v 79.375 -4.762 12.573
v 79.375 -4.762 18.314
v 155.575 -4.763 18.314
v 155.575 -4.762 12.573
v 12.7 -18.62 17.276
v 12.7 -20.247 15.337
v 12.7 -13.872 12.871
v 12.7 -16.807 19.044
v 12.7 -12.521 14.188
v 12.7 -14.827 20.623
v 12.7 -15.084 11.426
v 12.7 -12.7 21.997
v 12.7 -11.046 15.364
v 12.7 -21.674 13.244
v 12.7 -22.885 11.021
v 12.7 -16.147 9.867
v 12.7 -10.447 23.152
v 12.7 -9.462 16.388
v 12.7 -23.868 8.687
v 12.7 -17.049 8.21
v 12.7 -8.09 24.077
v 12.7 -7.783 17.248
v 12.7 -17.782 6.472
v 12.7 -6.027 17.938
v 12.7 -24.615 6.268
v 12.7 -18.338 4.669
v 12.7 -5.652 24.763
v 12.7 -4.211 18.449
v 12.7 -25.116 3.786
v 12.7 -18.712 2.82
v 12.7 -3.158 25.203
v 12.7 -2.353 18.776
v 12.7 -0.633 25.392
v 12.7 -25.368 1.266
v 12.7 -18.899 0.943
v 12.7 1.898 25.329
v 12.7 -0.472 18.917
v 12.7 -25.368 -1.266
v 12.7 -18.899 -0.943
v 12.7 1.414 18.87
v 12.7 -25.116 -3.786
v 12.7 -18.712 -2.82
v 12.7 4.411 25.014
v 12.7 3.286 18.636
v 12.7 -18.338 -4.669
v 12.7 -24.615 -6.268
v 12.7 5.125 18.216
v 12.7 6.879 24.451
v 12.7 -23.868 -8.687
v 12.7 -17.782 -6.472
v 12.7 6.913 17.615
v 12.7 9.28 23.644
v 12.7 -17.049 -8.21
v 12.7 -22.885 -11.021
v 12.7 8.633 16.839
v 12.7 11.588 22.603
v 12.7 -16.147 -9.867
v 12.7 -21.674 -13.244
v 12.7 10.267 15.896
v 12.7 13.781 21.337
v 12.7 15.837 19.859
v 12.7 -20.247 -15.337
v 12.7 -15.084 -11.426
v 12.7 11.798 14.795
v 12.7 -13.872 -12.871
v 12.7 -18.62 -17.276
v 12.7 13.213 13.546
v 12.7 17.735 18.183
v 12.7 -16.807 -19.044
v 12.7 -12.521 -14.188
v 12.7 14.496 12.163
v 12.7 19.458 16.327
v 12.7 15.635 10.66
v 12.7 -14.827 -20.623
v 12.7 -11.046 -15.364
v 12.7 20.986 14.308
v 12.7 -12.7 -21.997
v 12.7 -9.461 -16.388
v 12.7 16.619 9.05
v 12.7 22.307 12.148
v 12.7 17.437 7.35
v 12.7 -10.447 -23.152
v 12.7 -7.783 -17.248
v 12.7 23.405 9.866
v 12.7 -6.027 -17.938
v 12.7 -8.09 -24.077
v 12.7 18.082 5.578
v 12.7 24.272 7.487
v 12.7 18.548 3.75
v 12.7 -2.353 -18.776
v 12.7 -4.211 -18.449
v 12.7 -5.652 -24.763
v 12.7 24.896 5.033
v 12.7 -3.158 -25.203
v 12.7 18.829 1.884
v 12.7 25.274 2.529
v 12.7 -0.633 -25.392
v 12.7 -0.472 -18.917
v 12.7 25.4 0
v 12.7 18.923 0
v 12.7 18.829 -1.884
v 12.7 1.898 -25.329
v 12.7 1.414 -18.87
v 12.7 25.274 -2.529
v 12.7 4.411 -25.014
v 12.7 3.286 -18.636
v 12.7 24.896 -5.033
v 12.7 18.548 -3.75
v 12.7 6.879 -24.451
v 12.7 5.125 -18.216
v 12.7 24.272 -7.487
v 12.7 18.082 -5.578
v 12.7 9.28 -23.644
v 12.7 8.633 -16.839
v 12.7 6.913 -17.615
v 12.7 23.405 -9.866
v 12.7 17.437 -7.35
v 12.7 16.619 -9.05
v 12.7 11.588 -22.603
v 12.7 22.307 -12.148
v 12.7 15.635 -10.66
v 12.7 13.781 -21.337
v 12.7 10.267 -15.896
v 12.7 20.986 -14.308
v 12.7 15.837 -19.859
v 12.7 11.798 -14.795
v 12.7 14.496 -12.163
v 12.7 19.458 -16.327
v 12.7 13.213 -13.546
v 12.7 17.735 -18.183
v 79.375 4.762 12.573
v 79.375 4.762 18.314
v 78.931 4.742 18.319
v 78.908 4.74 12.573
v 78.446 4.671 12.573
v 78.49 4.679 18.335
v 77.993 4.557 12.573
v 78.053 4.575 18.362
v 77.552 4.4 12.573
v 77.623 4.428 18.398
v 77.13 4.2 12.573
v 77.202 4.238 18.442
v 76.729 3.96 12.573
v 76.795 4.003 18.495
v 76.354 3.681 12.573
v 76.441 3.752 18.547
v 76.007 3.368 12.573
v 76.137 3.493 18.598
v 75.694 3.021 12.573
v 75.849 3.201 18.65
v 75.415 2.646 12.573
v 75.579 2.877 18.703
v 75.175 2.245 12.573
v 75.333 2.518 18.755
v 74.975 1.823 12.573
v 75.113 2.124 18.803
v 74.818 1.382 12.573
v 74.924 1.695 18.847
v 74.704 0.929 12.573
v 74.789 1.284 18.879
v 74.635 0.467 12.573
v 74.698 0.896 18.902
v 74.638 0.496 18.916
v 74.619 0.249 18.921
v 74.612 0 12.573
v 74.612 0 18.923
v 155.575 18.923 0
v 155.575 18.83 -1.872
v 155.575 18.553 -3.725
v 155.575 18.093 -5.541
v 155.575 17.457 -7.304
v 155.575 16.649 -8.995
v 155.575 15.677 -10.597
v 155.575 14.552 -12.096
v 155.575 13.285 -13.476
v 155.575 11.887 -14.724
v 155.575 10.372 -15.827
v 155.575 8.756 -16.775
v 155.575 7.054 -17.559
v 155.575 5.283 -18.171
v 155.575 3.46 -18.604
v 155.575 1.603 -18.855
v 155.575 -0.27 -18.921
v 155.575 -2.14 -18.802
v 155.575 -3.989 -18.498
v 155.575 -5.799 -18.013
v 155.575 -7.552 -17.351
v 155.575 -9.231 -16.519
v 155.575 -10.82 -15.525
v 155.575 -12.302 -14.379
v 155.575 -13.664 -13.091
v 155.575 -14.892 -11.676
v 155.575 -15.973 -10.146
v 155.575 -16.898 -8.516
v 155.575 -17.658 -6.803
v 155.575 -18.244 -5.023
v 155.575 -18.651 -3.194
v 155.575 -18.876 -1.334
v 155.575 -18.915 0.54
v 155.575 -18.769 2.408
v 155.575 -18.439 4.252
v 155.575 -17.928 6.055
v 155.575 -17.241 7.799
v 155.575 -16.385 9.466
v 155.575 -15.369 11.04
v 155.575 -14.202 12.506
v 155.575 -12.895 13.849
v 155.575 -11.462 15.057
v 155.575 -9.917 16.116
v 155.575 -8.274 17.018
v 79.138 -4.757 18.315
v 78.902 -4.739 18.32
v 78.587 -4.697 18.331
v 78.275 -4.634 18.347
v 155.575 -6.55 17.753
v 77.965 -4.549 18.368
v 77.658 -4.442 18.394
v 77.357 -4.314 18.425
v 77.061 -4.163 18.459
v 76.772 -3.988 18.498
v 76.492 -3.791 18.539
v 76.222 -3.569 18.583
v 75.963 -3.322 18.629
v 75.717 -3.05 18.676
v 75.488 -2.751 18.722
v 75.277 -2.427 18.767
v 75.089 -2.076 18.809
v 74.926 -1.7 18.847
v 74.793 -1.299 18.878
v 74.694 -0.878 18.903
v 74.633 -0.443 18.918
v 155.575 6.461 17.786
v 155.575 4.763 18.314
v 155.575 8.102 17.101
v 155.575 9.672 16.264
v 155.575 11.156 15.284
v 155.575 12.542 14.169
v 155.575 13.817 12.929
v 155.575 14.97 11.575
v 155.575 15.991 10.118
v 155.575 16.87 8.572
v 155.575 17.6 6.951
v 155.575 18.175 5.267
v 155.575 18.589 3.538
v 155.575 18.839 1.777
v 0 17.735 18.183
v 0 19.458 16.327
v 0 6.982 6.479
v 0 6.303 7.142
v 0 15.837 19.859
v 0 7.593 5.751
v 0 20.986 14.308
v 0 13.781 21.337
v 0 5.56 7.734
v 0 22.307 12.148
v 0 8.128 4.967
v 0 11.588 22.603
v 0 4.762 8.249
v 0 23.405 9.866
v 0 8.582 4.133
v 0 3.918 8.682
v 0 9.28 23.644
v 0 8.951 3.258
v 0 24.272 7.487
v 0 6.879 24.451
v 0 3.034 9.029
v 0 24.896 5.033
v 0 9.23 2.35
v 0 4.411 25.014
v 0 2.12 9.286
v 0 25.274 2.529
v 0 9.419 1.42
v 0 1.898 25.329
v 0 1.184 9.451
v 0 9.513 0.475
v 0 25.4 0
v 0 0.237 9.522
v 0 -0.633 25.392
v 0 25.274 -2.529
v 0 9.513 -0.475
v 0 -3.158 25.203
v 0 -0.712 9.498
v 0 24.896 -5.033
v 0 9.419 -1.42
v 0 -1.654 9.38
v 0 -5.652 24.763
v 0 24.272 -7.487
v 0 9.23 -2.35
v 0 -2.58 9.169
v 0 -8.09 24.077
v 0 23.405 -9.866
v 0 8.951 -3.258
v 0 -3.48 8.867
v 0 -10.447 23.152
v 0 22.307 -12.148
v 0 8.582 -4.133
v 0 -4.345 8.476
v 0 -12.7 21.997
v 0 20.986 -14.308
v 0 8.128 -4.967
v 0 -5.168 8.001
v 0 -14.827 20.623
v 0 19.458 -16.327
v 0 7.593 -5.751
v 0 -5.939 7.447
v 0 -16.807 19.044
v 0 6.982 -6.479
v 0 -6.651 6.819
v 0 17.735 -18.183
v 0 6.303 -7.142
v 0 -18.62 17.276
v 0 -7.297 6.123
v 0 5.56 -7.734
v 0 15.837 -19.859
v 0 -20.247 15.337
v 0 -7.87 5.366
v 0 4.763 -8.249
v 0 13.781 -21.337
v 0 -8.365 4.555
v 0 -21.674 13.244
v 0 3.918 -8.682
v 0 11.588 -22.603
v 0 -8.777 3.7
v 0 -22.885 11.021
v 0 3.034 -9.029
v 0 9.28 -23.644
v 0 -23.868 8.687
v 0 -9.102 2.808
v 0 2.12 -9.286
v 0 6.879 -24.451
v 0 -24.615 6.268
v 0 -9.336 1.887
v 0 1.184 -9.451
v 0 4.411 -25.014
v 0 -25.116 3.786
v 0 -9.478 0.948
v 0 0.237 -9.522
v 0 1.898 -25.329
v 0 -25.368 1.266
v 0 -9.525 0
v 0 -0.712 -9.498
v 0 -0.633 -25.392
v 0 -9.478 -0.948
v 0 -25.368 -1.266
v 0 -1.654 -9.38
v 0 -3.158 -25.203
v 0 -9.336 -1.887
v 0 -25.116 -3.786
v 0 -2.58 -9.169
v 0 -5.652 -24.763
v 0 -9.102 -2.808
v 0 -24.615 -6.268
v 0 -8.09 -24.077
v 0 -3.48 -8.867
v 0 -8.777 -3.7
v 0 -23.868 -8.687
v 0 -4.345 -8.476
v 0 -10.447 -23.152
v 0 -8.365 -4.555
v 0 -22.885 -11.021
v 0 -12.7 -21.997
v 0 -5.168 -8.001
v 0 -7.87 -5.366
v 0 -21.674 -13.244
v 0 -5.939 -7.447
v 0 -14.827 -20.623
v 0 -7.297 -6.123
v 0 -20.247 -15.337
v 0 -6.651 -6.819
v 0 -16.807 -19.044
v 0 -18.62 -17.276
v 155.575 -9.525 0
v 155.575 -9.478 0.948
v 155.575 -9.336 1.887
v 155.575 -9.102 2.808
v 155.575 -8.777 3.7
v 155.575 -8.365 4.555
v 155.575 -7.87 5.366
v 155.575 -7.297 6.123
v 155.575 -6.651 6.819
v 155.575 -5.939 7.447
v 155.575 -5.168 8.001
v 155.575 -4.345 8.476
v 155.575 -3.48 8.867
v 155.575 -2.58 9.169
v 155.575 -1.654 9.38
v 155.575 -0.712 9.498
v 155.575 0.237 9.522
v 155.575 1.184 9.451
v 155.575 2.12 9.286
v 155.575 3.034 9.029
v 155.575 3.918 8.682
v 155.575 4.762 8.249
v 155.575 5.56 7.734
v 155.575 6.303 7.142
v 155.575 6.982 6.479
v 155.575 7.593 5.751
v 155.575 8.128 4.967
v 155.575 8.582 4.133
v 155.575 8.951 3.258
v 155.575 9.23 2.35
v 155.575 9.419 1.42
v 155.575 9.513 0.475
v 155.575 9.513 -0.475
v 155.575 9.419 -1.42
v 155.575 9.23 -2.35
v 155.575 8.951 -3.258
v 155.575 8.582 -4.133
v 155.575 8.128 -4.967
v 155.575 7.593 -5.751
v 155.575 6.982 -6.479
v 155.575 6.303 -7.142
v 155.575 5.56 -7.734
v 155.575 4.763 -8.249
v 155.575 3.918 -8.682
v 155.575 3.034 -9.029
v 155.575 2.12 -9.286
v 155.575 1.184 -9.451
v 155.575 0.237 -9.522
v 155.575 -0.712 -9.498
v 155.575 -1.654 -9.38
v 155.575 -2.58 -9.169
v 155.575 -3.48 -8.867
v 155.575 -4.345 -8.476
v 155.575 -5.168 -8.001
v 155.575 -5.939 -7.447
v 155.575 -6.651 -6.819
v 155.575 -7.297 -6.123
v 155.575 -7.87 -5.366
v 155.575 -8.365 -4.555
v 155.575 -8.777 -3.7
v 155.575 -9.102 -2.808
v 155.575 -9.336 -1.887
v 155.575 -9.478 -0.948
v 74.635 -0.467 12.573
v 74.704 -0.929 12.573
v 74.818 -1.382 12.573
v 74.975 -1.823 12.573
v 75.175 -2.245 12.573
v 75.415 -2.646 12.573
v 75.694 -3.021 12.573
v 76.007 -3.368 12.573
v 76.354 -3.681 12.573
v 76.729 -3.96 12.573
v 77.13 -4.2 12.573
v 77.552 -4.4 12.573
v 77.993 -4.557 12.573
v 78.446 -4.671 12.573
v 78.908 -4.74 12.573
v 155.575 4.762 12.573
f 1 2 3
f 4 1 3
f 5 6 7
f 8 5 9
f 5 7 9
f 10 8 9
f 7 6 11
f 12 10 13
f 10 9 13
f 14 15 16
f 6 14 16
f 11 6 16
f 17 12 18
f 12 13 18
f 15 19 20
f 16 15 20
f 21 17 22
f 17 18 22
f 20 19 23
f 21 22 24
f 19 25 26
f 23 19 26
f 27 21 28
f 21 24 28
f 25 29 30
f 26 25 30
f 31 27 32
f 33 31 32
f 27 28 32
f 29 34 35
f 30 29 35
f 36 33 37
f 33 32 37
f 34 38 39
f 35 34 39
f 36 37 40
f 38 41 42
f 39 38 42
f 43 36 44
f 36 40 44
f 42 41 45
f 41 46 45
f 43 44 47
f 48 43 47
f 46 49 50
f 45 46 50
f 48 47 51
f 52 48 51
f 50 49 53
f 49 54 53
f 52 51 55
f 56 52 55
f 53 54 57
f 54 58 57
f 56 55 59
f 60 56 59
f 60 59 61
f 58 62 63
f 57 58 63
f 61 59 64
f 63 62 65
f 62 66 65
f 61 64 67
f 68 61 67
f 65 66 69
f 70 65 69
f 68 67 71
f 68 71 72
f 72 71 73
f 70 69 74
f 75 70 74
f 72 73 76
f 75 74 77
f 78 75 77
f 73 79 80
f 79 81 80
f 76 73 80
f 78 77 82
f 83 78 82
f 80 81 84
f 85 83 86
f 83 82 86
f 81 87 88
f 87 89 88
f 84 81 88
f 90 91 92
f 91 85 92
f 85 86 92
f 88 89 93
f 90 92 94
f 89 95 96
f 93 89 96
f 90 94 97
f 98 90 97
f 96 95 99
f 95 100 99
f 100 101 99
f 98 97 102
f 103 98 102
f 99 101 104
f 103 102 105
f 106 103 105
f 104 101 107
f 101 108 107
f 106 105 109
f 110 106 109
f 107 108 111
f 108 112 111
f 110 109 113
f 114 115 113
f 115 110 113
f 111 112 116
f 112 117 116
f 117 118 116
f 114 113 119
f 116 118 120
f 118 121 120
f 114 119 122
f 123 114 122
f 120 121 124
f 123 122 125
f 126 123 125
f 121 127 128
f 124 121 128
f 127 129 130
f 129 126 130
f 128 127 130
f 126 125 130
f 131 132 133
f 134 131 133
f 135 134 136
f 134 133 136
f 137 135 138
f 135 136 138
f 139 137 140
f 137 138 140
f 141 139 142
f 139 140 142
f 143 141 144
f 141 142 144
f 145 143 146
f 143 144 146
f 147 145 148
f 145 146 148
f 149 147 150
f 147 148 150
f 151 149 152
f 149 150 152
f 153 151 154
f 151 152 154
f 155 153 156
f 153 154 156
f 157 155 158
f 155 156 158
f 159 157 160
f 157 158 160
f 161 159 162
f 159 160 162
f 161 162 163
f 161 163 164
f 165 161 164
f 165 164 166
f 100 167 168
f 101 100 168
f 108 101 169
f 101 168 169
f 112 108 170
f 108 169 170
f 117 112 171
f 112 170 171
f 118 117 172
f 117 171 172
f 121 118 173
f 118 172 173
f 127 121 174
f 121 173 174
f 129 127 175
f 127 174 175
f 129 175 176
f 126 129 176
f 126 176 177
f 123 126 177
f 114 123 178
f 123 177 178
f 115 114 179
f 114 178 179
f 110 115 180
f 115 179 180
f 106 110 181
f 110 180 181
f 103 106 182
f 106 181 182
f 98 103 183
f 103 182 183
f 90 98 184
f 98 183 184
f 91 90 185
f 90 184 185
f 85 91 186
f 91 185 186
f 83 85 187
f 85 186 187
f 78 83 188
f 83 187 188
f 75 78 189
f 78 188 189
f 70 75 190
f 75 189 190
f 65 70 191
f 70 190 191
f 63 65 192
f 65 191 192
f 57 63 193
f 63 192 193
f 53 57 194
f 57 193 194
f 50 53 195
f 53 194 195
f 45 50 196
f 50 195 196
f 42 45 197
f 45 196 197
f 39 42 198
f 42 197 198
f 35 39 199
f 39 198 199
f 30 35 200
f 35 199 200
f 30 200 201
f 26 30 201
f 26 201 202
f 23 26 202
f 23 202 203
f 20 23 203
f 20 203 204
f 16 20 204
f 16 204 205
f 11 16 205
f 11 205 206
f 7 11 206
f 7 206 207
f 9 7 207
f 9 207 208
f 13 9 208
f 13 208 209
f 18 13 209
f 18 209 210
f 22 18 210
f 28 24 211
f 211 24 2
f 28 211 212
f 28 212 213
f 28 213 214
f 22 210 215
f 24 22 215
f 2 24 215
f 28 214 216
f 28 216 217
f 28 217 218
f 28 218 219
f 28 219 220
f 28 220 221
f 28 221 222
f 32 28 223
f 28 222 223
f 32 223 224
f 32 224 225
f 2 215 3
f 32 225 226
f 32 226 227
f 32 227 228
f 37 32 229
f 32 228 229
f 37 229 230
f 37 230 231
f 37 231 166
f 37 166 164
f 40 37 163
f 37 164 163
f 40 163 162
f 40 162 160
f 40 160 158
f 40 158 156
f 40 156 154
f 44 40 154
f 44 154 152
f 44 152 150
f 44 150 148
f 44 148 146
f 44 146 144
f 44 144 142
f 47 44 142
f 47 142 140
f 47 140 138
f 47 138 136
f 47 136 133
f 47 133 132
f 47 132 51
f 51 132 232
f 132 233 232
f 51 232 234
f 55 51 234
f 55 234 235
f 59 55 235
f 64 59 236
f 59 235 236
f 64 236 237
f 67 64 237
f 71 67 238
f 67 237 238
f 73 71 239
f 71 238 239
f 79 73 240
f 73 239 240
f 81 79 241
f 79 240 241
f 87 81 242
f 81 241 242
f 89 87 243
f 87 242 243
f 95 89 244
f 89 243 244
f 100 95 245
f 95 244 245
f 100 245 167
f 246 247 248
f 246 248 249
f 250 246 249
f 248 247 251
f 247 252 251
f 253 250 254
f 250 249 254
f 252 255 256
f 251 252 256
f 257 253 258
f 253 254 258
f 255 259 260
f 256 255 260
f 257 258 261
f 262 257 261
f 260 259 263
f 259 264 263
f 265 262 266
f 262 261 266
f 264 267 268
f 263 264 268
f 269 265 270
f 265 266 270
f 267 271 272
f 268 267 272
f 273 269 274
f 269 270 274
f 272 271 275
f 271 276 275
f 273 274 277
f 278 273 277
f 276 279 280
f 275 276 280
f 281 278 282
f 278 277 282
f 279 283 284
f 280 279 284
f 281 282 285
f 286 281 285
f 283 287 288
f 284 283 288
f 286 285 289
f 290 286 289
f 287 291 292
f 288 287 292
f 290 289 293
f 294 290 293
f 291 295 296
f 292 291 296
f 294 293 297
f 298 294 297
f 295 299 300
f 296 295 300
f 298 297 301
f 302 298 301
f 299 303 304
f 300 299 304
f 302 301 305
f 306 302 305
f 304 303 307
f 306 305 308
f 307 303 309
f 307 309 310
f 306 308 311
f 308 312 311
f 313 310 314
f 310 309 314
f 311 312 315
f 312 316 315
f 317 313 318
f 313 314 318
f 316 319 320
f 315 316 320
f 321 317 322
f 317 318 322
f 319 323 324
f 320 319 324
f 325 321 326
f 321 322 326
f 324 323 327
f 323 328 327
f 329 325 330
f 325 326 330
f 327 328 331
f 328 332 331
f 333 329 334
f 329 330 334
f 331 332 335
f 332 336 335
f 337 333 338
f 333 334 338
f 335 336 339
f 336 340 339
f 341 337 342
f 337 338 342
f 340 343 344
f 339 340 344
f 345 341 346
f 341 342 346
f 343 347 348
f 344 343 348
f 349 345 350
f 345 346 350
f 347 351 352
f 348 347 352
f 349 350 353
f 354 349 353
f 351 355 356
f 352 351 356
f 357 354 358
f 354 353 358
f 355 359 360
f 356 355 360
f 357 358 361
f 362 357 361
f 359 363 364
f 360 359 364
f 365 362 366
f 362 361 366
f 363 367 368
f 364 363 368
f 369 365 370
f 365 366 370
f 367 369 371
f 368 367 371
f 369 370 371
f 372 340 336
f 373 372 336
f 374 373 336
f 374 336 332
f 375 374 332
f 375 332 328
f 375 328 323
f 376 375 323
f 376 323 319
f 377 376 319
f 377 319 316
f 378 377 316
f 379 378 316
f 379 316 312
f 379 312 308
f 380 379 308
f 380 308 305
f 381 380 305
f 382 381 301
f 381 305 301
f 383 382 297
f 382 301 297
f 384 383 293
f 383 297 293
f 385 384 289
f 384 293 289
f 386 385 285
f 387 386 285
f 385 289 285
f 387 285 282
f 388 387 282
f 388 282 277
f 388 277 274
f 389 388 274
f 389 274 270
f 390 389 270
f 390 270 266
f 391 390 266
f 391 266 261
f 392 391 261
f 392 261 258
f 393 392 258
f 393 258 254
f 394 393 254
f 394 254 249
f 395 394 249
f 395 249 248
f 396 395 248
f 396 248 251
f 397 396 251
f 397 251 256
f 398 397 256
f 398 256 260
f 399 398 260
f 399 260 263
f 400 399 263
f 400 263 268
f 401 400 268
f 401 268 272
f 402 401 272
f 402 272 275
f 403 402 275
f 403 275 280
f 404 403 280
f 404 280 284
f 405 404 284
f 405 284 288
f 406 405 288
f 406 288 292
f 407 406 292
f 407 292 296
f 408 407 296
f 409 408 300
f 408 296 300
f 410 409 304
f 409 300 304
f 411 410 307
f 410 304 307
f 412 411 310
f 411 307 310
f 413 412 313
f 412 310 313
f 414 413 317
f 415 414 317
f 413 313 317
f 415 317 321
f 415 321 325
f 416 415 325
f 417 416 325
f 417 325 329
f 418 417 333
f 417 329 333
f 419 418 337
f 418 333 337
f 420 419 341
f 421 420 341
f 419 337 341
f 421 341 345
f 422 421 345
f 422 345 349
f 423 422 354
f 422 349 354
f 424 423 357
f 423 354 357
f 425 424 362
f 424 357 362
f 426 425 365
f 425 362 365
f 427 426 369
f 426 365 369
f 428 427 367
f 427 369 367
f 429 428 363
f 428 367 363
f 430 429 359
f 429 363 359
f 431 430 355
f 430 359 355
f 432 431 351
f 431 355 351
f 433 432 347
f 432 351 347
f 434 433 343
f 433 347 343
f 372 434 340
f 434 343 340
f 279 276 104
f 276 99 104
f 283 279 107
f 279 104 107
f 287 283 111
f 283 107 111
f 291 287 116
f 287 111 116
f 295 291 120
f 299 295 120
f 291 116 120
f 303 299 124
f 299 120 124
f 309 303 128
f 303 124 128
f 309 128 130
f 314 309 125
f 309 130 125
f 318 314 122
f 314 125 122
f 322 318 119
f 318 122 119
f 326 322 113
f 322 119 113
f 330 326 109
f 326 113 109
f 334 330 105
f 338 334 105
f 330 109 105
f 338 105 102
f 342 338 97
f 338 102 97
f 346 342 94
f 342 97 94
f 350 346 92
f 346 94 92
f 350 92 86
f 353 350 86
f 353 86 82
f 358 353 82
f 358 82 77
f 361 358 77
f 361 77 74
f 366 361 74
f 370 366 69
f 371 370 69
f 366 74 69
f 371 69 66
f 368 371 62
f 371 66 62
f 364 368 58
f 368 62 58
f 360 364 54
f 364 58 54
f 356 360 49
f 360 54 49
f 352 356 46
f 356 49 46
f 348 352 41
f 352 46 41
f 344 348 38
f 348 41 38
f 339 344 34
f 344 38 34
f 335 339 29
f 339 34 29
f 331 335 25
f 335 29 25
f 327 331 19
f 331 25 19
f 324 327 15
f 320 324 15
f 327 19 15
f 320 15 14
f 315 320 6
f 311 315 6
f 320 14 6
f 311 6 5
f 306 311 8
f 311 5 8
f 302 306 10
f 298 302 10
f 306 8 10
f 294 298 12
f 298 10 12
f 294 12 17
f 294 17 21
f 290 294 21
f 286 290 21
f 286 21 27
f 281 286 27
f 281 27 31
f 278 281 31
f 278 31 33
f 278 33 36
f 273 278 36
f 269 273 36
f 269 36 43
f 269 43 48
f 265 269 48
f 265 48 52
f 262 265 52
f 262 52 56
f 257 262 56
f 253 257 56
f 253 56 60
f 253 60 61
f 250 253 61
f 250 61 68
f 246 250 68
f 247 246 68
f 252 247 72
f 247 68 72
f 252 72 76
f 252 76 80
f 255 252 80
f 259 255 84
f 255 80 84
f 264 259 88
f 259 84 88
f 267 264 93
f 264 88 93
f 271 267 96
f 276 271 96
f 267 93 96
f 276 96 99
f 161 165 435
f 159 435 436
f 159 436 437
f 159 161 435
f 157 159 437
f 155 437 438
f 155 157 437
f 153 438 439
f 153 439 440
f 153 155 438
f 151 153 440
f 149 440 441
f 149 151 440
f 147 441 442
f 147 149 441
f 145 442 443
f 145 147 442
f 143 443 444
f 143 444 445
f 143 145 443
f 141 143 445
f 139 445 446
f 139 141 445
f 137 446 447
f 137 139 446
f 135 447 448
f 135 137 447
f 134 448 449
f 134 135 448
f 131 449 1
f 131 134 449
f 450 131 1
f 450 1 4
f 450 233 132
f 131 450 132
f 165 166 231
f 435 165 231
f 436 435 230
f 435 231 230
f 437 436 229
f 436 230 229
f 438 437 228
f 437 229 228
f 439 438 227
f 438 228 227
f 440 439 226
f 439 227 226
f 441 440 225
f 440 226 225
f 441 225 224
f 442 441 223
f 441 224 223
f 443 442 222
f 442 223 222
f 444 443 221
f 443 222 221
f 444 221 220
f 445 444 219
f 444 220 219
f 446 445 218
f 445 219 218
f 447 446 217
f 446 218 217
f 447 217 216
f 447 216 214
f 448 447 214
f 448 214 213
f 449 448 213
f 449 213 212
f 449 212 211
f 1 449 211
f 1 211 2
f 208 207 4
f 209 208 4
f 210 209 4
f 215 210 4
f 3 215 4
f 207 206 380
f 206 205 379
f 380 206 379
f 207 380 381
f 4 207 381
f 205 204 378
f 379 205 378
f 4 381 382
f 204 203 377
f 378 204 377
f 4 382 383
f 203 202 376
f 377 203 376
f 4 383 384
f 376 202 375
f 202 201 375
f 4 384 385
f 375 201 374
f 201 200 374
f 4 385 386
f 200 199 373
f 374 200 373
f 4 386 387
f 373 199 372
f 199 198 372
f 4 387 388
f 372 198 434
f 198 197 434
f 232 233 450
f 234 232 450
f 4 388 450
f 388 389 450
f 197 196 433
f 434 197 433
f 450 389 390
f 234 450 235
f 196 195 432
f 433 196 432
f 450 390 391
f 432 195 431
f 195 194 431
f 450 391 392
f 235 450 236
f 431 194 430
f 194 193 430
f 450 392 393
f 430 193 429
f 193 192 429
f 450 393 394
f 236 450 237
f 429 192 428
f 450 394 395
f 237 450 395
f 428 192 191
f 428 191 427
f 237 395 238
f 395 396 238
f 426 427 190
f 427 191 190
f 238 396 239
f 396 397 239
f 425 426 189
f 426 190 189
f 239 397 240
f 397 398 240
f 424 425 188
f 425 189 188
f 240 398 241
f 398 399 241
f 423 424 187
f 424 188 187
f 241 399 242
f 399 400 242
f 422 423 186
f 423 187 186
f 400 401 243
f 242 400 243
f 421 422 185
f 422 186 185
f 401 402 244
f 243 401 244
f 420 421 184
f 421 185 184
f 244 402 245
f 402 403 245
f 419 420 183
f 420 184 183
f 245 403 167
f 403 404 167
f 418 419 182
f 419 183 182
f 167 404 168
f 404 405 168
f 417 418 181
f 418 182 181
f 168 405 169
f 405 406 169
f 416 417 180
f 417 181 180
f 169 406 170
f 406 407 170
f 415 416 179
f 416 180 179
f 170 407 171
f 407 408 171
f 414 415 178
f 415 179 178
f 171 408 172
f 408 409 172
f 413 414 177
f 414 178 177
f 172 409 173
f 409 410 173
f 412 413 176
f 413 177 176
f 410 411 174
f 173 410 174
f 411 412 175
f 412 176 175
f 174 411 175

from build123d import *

# Parameters (mm, degrees)
CUT_EXTRUDE1_DEPTH = 6.35
SKETCH3_R          = 9.525
CUT_EXTRUDE2_DEPTH = 160.668095298


with BuildPart() as part:
    # Sketch1 → Revolve1 (revolve)
    with BuildSketch(Plane.XY):
        Polygon((155.575, 0), (0, 0), (0, 25.4), (12.7, 25.4), (12.7, 18.923), (155.575, 18.923), align=None)
    revolve(axis=Axis((155.575, 0, 0), (-1, 0, 0)))

    # Sketch2 → Cut-Extrude1 (cut)
    with BuildSketch(Plane.XY.offset(18.923)):
        with BuildLine():
            Line((74.6125, 0), (155.575, 0))
            Line((155.575, 0), (155.575, 4.7625))
            Line((155.575, 4.7625), (79.375, 4.7625))
            ThreePointArc((79.375, 4.7625), (76.007403955, 3.367596045), (74.6125, 0))
        make_face()
        with BuildLine():
            Line((155.575, -4.7625), (155.575, 0))
            Line((155.575, 0), (74.6125, 0))
            ThreePointArc((74.6125, 0), (76.007403955, -3.367596045), (79.375, -4.7625))
            Line((79.375, -4.7625), (155.575, -4.7625))
        make_face()
    extrude(amount=-CUT_EXTRUDE1_DEPTH, mode=Mode.SUBTRACT)

    # Sketch3 → Cut-Extrude2 (cut, through all)
    with BuildSketch(Plane.ZY):
        with Locations(Location((0, 0, 0), (0, 0, 270))):
            Circle(SKETCH3_R)
    extrude(amount=-CUT_EXTRUDE2_DEPTH, mode=Mode.SUBTRACT)


solid = part.part
